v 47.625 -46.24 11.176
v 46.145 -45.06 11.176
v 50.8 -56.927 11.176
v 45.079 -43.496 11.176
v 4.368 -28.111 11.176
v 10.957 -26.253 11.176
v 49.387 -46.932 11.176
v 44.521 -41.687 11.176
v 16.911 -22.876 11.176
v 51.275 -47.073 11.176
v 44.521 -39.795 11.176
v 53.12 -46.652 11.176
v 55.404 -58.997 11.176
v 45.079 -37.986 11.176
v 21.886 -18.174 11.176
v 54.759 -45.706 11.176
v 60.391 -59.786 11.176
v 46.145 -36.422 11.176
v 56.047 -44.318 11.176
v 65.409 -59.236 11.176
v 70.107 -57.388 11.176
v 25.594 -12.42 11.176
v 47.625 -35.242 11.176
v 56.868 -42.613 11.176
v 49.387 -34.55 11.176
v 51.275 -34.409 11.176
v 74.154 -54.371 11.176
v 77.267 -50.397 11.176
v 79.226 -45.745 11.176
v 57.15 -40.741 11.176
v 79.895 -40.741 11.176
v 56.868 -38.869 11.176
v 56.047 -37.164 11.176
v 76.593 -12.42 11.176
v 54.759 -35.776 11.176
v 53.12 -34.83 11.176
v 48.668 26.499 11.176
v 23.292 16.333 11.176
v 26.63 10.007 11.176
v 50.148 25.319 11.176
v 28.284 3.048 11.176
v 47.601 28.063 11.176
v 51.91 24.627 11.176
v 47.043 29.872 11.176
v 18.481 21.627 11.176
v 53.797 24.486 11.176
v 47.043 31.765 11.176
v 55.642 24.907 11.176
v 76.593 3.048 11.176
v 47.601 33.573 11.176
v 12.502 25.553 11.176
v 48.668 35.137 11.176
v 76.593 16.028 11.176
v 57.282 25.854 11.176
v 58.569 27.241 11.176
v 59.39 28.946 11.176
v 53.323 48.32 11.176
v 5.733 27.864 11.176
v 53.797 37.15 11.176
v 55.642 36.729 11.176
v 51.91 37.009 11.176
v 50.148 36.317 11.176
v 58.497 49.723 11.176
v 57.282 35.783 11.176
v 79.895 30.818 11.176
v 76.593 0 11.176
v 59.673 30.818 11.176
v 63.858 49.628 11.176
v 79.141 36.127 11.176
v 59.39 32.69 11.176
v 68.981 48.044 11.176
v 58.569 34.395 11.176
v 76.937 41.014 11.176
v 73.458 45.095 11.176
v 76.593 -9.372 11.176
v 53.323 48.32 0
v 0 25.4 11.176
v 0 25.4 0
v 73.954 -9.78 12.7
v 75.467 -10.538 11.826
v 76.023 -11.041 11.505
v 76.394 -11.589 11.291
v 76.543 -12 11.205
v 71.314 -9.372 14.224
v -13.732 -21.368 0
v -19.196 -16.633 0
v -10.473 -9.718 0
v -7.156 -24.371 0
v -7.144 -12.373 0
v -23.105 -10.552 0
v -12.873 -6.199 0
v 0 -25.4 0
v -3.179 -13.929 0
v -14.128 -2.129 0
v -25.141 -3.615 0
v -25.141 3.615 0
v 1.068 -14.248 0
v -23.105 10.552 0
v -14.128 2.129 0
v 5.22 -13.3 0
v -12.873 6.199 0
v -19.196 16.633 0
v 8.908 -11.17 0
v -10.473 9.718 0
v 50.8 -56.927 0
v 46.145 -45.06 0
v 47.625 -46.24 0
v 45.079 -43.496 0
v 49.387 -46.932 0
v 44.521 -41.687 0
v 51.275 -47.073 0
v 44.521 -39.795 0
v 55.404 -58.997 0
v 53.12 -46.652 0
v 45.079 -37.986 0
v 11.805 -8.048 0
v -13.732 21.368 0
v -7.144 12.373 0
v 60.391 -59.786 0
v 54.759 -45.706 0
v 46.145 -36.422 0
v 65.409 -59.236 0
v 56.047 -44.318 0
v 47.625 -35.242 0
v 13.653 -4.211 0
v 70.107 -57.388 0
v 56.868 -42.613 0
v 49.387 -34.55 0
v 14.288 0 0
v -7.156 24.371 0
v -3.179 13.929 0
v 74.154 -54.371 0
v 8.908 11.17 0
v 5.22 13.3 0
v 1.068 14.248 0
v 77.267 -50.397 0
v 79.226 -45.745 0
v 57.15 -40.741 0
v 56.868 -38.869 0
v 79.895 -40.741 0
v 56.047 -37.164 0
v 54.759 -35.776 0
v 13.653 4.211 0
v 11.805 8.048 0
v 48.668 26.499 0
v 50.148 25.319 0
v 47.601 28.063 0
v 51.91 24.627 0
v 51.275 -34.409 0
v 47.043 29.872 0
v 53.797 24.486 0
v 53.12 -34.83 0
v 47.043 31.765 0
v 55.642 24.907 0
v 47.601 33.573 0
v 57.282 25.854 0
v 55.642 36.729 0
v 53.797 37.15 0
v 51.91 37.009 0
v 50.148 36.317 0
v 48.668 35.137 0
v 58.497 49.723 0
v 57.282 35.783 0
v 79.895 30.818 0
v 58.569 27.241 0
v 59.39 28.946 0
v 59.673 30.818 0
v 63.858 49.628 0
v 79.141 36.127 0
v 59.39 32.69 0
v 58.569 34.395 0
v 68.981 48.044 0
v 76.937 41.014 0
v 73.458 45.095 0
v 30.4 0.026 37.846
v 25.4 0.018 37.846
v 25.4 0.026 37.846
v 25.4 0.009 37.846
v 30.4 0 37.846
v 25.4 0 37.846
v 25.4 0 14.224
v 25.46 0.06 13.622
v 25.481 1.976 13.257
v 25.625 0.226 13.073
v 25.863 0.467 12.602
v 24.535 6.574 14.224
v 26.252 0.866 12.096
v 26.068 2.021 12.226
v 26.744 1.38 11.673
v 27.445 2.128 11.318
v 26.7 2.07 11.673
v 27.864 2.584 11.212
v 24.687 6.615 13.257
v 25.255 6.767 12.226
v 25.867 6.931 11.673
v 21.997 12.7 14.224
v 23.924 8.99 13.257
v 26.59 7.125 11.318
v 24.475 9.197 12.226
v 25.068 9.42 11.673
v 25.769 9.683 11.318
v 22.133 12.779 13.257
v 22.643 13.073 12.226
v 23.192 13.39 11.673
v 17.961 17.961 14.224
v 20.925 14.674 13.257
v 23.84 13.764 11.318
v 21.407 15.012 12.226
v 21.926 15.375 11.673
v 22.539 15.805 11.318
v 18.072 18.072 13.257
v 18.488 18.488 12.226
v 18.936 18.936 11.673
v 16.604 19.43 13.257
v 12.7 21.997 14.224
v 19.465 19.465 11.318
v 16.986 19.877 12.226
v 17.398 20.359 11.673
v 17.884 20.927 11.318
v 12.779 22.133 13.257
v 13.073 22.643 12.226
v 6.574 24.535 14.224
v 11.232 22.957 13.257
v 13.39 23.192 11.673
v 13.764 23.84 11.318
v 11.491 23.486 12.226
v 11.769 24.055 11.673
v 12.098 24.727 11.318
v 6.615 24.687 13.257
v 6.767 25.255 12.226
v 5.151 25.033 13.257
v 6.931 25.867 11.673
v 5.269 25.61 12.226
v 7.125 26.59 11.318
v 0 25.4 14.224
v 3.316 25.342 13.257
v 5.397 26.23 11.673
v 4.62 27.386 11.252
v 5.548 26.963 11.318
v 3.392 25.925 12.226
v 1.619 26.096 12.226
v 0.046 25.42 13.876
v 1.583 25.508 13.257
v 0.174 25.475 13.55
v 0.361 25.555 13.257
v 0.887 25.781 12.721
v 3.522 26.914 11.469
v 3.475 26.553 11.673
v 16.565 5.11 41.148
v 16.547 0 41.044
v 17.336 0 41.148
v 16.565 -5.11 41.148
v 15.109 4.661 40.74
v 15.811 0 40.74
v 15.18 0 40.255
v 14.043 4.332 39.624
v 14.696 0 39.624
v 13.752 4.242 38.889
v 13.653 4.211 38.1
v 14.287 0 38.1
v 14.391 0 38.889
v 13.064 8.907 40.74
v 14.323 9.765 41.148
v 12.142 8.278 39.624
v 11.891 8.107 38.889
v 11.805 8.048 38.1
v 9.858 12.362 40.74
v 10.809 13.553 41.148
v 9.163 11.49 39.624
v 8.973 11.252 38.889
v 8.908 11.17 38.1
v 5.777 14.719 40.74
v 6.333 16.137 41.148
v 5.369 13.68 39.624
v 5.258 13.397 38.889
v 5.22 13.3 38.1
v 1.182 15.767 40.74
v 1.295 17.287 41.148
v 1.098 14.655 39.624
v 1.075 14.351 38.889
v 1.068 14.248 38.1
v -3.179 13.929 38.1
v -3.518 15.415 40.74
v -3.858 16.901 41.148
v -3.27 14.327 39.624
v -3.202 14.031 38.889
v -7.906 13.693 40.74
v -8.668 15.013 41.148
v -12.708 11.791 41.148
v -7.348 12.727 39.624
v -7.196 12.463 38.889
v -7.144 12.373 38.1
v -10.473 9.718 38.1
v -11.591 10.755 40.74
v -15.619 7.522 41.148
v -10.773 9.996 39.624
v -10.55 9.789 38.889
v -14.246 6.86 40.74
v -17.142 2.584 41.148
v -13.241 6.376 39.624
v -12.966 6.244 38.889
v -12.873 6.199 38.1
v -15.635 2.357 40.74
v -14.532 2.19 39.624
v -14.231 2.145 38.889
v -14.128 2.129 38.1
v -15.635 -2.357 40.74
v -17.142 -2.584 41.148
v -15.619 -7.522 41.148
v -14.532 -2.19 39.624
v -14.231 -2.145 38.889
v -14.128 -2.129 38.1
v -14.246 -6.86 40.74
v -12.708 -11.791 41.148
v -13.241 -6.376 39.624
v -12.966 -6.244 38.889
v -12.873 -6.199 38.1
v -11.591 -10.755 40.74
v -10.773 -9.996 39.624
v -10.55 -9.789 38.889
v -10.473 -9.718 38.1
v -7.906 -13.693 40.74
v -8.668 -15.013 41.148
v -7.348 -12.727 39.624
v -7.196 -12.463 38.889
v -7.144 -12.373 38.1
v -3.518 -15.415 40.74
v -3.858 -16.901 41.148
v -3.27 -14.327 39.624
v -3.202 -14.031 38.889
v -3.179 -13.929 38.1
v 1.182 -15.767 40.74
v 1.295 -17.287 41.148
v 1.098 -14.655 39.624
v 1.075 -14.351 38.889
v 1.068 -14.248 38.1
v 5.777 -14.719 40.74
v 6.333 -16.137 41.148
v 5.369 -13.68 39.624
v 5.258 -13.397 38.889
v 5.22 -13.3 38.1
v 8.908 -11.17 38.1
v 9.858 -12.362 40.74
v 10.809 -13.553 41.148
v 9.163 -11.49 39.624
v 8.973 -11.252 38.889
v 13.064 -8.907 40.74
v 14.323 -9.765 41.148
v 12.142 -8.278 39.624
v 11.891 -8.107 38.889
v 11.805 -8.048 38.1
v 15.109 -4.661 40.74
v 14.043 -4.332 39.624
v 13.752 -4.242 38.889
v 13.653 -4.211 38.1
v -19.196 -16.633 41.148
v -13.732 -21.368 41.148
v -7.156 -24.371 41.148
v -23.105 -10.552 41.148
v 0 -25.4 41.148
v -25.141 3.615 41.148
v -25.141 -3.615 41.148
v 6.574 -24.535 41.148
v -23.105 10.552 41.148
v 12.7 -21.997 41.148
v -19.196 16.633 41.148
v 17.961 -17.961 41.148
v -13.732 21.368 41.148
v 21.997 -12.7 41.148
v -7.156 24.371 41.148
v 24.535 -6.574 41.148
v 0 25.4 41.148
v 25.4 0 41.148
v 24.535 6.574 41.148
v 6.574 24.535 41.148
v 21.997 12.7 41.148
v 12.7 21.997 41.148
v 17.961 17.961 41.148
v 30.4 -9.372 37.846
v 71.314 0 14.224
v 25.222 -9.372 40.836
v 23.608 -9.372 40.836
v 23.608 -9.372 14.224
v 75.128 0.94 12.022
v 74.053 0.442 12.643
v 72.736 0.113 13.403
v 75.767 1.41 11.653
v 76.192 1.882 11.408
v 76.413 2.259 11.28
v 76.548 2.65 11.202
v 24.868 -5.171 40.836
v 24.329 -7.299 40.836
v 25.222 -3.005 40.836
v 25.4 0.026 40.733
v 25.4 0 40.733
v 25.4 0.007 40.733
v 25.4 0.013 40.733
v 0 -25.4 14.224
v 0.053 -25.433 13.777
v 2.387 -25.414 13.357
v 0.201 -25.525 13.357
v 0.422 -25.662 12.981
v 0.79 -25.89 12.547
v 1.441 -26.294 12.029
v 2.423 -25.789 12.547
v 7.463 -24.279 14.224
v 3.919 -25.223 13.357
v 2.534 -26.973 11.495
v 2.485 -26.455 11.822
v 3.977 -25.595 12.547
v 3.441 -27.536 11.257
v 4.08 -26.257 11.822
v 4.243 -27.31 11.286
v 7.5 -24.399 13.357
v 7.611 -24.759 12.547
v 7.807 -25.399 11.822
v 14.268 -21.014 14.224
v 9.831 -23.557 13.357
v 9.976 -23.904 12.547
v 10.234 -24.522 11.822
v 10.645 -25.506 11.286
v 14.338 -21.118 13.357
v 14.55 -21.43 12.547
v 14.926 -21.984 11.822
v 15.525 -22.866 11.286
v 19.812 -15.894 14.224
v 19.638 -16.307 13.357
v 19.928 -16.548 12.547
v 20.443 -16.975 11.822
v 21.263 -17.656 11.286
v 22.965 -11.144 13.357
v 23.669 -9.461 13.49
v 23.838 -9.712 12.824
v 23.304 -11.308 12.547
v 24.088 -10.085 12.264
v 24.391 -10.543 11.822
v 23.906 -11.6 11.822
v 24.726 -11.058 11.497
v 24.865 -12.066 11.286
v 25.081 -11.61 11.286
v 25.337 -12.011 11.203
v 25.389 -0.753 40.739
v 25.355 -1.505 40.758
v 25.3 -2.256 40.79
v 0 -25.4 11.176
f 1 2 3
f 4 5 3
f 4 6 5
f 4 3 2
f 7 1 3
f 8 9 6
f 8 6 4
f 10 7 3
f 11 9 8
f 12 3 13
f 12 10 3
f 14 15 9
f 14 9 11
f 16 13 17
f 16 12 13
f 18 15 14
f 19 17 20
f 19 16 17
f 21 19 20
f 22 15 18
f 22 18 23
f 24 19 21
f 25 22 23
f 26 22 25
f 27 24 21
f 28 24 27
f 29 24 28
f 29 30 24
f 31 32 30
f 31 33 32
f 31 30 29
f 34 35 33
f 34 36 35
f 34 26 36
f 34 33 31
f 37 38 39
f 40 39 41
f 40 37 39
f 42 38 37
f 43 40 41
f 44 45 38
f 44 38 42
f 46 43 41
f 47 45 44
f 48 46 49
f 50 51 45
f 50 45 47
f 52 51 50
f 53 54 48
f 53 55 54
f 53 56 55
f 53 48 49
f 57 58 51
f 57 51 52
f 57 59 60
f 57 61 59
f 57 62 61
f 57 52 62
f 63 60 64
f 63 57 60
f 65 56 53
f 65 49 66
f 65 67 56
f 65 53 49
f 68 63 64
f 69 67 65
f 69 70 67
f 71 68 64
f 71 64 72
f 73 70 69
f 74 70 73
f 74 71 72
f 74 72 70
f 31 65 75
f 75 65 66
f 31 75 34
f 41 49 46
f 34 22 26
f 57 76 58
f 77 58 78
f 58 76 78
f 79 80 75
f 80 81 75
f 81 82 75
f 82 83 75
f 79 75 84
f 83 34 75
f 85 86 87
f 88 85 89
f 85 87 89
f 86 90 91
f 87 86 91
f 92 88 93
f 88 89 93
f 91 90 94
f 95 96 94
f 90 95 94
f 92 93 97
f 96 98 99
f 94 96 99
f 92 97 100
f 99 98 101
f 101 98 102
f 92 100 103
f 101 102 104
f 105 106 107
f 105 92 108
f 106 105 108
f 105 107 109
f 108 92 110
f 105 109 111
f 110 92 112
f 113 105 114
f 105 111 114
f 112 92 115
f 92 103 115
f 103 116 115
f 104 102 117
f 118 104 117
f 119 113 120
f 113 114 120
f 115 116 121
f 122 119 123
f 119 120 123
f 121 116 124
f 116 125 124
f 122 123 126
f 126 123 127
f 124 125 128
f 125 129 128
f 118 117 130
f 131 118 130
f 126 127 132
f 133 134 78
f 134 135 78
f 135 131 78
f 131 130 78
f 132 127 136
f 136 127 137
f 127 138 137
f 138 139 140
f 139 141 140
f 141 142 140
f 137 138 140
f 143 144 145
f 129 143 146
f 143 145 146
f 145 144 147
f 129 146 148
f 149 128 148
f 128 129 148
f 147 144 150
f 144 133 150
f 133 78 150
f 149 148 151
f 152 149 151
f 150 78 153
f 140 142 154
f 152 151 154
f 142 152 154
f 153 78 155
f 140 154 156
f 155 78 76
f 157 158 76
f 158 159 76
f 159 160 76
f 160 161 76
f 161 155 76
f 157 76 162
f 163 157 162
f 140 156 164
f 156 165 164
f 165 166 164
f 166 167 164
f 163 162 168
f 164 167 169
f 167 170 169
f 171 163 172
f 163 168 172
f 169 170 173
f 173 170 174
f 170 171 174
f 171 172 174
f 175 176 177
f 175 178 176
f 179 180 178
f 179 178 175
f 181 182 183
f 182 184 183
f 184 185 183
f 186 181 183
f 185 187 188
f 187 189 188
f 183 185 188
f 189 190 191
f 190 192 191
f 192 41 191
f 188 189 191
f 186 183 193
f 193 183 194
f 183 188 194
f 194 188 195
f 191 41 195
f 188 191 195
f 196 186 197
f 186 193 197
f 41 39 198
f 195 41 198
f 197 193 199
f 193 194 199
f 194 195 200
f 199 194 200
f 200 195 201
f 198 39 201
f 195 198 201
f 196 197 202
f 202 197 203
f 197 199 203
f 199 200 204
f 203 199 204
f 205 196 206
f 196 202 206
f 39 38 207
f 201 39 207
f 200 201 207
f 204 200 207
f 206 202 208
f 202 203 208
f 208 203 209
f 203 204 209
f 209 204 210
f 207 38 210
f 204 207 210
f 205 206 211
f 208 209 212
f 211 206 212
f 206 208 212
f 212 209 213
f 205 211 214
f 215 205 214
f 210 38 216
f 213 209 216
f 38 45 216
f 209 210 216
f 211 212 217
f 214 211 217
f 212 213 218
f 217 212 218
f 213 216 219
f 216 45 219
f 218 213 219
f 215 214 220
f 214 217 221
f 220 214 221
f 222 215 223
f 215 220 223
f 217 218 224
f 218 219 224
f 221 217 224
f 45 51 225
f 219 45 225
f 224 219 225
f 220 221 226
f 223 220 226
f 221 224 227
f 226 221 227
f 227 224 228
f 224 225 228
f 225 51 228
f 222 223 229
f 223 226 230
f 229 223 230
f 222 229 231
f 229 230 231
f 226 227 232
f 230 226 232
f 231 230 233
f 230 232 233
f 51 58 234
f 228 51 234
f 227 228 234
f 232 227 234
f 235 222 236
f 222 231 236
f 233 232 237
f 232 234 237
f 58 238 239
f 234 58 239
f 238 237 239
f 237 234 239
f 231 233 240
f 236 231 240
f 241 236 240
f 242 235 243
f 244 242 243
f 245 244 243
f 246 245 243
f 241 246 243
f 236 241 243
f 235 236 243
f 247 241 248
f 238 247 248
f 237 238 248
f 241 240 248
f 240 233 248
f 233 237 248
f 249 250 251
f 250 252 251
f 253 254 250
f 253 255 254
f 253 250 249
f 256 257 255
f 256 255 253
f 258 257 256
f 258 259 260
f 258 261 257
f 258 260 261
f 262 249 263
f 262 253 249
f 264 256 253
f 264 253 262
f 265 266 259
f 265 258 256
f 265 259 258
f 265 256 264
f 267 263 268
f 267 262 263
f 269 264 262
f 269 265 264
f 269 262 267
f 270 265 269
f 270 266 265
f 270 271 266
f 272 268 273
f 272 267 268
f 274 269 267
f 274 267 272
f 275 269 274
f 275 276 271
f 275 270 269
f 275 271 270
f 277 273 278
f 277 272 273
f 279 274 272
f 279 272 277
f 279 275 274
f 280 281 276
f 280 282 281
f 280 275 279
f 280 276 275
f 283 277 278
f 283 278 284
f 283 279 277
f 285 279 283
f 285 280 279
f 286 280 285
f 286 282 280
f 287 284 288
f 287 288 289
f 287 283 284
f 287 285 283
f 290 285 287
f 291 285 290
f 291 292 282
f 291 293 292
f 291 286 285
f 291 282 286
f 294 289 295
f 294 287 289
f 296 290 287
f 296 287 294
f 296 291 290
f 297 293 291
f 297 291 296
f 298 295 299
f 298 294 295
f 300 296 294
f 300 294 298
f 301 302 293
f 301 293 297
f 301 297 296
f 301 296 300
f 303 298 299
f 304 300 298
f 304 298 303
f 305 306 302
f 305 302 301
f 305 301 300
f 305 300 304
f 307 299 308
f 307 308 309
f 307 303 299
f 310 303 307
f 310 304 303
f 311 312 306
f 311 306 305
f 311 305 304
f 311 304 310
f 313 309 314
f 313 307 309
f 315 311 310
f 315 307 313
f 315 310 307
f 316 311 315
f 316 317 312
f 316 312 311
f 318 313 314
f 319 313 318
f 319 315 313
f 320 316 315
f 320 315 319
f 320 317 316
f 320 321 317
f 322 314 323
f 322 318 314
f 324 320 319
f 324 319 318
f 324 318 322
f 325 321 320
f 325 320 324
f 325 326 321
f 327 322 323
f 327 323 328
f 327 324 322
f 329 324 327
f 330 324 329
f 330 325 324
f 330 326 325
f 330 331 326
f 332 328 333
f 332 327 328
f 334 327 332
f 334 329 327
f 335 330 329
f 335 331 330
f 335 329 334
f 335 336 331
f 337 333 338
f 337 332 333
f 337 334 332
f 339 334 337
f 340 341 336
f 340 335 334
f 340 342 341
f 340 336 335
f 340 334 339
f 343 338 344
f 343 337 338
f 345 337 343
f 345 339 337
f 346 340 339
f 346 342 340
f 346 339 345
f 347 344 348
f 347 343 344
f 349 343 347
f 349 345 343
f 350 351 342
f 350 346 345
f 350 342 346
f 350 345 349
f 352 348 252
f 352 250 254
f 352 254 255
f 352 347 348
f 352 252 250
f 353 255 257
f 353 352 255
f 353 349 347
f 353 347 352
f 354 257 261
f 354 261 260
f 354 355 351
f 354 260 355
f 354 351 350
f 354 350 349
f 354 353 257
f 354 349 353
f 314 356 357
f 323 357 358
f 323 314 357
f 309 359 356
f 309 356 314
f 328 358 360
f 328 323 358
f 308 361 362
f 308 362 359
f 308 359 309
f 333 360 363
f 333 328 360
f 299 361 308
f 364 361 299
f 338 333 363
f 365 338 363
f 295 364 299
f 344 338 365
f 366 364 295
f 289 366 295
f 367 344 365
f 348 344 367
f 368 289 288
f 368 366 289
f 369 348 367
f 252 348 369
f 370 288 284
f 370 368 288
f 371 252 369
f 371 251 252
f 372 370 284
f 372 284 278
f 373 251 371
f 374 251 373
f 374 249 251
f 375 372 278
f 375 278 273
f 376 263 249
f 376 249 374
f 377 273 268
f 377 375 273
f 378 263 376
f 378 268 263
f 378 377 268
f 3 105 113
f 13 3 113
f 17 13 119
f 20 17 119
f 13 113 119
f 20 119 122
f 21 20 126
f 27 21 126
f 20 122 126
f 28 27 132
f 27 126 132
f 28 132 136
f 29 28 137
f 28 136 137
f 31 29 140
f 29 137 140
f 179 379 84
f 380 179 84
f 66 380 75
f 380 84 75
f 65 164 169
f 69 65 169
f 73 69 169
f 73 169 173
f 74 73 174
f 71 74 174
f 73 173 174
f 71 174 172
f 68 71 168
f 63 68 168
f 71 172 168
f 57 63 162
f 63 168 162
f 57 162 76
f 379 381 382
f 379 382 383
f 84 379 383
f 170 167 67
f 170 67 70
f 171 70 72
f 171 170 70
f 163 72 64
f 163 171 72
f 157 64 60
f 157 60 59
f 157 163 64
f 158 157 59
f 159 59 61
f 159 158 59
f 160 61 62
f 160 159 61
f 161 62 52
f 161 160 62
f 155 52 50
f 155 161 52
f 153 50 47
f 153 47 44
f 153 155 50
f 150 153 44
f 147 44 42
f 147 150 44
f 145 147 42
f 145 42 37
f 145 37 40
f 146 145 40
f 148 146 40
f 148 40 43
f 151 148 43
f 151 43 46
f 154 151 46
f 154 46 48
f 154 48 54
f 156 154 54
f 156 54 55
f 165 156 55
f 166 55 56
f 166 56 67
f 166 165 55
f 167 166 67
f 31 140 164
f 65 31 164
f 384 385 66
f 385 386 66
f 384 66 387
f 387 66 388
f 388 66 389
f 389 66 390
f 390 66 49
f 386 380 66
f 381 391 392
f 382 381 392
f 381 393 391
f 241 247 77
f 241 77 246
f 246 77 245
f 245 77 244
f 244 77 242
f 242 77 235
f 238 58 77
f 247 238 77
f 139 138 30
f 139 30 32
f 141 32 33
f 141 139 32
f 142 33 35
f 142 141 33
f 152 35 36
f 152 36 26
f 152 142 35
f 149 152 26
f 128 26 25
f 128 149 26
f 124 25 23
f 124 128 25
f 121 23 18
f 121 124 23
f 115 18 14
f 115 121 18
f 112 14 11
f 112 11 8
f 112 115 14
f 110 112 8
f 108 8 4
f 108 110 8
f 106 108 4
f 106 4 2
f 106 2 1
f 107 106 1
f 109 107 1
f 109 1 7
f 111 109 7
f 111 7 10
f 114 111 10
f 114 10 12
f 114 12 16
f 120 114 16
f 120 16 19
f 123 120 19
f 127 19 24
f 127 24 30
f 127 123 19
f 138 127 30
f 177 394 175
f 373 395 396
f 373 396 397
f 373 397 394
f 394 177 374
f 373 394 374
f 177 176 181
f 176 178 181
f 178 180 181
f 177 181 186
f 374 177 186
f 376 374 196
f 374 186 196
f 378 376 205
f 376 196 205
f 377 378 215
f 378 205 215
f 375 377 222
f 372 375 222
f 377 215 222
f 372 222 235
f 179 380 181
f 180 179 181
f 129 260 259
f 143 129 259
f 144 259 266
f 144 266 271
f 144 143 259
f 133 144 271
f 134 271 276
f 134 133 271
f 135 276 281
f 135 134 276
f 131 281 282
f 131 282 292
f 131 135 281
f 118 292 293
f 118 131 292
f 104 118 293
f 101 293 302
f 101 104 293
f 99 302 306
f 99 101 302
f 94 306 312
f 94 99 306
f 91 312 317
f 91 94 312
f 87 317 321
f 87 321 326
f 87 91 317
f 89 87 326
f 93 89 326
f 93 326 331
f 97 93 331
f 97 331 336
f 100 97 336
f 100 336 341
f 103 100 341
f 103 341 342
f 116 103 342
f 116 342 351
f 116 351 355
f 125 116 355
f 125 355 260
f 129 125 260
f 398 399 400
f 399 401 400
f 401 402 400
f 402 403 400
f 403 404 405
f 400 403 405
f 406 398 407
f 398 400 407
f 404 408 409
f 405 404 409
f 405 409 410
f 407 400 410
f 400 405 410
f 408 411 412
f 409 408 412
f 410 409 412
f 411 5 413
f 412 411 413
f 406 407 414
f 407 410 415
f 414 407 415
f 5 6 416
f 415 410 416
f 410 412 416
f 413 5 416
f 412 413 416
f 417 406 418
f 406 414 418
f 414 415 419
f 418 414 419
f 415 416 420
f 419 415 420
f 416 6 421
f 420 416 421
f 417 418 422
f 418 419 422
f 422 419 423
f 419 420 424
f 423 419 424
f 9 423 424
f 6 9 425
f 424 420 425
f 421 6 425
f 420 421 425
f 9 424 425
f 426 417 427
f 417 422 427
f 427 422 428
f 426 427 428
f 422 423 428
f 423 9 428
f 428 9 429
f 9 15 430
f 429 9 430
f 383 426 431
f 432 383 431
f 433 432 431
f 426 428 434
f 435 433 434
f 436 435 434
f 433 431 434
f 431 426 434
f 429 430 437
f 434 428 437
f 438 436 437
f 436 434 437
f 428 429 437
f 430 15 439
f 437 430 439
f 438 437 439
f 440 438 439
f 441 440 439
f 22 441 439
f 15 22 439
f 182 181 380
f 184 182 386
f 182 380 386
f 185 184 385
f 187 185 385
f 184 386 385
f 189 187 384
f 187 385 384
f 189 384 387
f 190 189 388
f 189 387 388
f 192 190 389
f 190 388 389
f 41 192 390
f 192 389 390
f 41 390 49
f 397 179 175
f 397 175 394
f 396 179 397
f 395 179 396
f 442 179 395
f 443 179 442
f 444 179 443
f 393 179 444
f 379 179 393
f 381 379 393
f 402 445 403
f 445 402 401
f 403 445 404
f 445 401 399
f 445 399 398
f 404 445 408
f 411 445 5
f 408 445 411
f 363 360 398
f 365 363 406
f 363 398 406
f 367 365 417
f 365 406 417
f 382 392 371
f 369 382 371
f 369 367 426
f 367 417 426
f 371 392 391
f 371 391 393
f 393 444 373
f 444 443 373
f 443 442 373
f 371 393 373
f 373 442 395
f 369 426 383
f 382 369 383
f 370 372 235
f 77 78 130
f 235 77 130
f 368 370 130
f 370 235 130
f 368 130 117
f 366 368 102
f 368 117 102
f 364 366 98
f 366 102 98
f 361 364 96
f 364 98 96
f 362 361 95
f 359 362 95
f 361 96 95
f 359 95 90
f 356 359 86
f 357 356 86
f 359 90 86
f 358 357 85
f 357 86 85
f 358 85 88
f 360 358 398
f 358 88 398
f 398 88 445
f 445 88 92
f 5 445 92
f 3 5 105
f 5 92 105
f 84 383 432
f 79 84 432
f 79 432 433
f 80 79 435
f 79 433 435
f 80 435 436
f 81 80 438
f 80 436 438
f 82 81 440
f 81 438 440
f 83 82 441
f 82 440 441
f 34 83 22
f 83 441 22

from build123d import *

# Parameters (mm, degrees)
F0_R         = 14.2875
F1_DEPTH     = 41.148
F0_R_2       = 6.35
F2_DEPTH     = 11.176
F4_DEPTH     = 26.67
F6_DEPTH     = 25.4
F7_DEPTH     = 9.398
F8_T4_DEPTH  = 66.4333664876
F8_T9_ANGLE  = 124.391277417
F8_T14_DEPTH = 68.2254329645
F8_T19_ANGLE = 102.7340831682


# Not quite as in the source:
# - a fillet or chamfer that OpenCascade refuses, or shapes differently, is made with other operations: its cross-section is extruded or revolved along the edge and cut away or added


with BuildPart() as f1:
    # F0 (on Top) → F1 (new body)
    with BuildSketch(Plane.XY):
        with BuildLine():
            ThreePointArc((0, -25.4), (17.9605122421, -17.9605122421), (25.4, 0))
            ThreePointArc((25.4, 0), (17.9605122421, 17.9605122421), (0, 25.4))
            ThreePointArc((0, 25.4), (-25.4, 0), (0, -25.4))
        make_face()
        Circle(F0_R, mode=Mode.SUBTRACT)
    extrude(amount=F1_DEPTH)

    # F0 (on Top) → F2 (join)
    with BuildSketch(Plane.XY):
        with BuildLine():
            ThreePointArc((0, 25.4), (17.9605122421, 17.9605122421), (25.4, 0))
            ThreePointArc((25.4, 0), (17.9605122421, -17.9605122421), (0, -25.4))
            Line((0, -25.4), (50.8, -56.9271389808))
            ThreePointArc((50.8, -56.9271389808), (70.1065291687, -57.388260775), (79.8953664876, -40.740937693))
            Line((79.8953664876, -40.740937693), (79.8953664876, 30.8181623129))
            ThreePointArc((79.8953664876, 30.8181623129), (71.3237376894, 46.7274752131), (53.3225332112, 48.3198616445))
            Line((53.3225332112, 48.3198616445), (0, 25.4))
        make_face()
        with Locations((50.8, -40.740937693)):
            Circle(F0_R_2, mode=Mode.SUBTRACT)
        with Locations((53.3225332112, 30.8181623129)):
            Circle(F0_R_2, mode=Mode.SUBTRACT)
    extrude(amount=F2_DEPTH)

    # F3 (on face) → F4 (join)
    with BuildSketch(Plane.XY.offset(11.176)):
        with BuildLine():
            Line((76.5933664876, -9.3715246767), (76.5933664876, 0))
            Line((76.5933664876, 0), (25.4, 0))
            ThreePointArc((25.4, 0), (24.9479609536, -4.77066497), (23.6079335232, -9.3715246767))
            Line((23.6079335232, -9.3715246767), (76.5933664876, -9.3715246767))
        make_face()
    extrude(amount=F4_DEPTH)

    # F5 (on face) → F6 (cut)
    with BuildSketch(Plane.XZ.offset(9.3715246767)):
        Polygon((76.5933664876, 37.846), (30.3995714498, 37.846), (76.5933664876, 11.176), align=None)
    extrude(amount=-F6_DEPTH, mode=Mode.SUBTRACT)

    # F5 (on face) → F7 (join)
    with BuildSketch(Plane.XZ.offset(9.3715246767)):
        Polygon((30.3995714498, 37.846), (25.2215964692, 40.8355052489), (23.6079335232, 40.8355052489), (23.6079335232, 37.846), align=None)
    extrude(amount=-F7_DEPTH)

    # F8: fillet of radius 3.048 on 5 edges, made by hand


with BuildPart() as f8_tool2:
    # F8_s3 → F8_t4 (new body)
    with BuildSketch(Plane.YZ.offset(84.2133664876)):
        with BuildLine():
            ThreePointArc((0, 14.224), (0.8927385309, 12.0687385309), (3.048, 11.176))
            Line((3.048, 11.176), (0, 11.176))
            Line((0, 11.176), (0, 14.224))
        make_face()
    extrude(amount=-F8_T4_DEPTH)

    split(bisect_by=Plane(origin=(23.9876915783, 0, 41.5479005698), x_dir=(0, 1, 0), z_dir=(-0.5, 0, -0.8660254038)), keep=Keep.TOP)


with BuildPart() as f1_1:
    add(f1.part)

    # F8_t1: union F8_tool2
    add(f8_tool2.part)


with BuildPart() as f8_tool7:
    # F8_s8 → F8_t9 (revolve)
    with BuildSketch(Plane(origin=(0, 0, 0), x_dir=(0, 0, 1), z_dir=(-0.2956353345, -0.9553008683, 0))):
        with BuildLine():
            ThreePointArc((14.224, -25.4), (12.0687385309, -26.2927385309), (11.176, -28.448))
            Line((11.176, -28.448), (11.176, -25.4))
            Line((11.176, -25.4), (14.224, -25.4))
        make_face()
    revolve(axis=Axis((0, 0, 11.176), (0, 0, 1)), revolution_arc=F8_T9_ANGLE)

    split(bisect_by=Plane(origin=(-9.2152137271, 21.4389836917, 0), x_dir=(0, 0, 1), z_dir=(0.3948993846, -0.9187243744, 0)), keep=Keep.TOP)


with BuildPart() as f1_2:
    add(f1_1.part)

    # F8_t6: union F8_tool7
    add(f8_tool7.part)


with BuildPart() as f8_tool12:
    # F8_s13 → F8_t14 (new body)
    with BuildSketch(Plane.YZ.offset(15.9879335232)):
        with BuildLine():
            ThreePointArc((-9.3715246767, 14.224), (-10.2642632076, 12.0687385309), (-12.4195246767, 11.176))
            Line((-12.4195246767, 11.176), (-9.3715246767, 11.176))
            Line((-9.3715246767, 11.176), (-9.3715246767, 14.224))
        make_face()
    extrude(amount=F8_T14_DEPTH)

    split(bisect_by=Plane(origin=(23.9876915783, 0, 41.5479005698), x_dir=(0, 1, 0), z_dir=(-0.5, 0, -0.8660254038)), keep=Keep.TOP)


with BuildPart() as f1_3:
    add(f1_2.part)

    # F8_t11: union F8_tool12
    add(f8_tool12.part)


with BuildPart() as f8_tool17:
    # F8_s18 → F8_t19 (revolve)
    with BuildSketch(Plane(origin=(0, 0, 0), x_dir=(0, 0, 1), z_dir=(-0.9553159496, 0.2955865973, 0))):
        with BuildLine():
            ThreePointArc((14.224, -25.4), (12.0687385309, -26.2927385309), (11.176, -28.448))
            Line((11.176, -28.448), (11.176, -25.4))
            Line((11.176, -25.4), (14.224, -25.4))
        make_face()
    revolve(axis=Axis((0, 0, 11.176), (0, 0, 1)), revolution_arc=F8_T19_ANGLE)

    split(bisect_by=Plane(origin=(-11.3803201385, -18.3372256958, 0), x_dir=(0, 0, 1), z_dir=(0.5273158261, 0.8496693589, 0)), keep=Keep.TOP)


with BuildPart() as f1_4:
    add(f1_3.part)

    # F8_t16: union F8_tool17
    add(f8_tool17.part)

    # F8_s21 → F8_t22 (revolve, cut)
    with BuildSketch(Plane.XZ):
        with BuildLine():
            ThreePointArc((17.3355, 41.148), (15.1802385309, 40.2552614691), (14.2875, 38.1))
            Line((14.2875, 38.1), (14.2875, 41.148))
            Line((14.2875, 41.148), (17.3355, 41.148))
        make_face()
    revolve(axis=Axis((0, 0, 41.148), (0, 0, 1)), mode=Mode.SUBTRACT)


solid = f1_4.part
